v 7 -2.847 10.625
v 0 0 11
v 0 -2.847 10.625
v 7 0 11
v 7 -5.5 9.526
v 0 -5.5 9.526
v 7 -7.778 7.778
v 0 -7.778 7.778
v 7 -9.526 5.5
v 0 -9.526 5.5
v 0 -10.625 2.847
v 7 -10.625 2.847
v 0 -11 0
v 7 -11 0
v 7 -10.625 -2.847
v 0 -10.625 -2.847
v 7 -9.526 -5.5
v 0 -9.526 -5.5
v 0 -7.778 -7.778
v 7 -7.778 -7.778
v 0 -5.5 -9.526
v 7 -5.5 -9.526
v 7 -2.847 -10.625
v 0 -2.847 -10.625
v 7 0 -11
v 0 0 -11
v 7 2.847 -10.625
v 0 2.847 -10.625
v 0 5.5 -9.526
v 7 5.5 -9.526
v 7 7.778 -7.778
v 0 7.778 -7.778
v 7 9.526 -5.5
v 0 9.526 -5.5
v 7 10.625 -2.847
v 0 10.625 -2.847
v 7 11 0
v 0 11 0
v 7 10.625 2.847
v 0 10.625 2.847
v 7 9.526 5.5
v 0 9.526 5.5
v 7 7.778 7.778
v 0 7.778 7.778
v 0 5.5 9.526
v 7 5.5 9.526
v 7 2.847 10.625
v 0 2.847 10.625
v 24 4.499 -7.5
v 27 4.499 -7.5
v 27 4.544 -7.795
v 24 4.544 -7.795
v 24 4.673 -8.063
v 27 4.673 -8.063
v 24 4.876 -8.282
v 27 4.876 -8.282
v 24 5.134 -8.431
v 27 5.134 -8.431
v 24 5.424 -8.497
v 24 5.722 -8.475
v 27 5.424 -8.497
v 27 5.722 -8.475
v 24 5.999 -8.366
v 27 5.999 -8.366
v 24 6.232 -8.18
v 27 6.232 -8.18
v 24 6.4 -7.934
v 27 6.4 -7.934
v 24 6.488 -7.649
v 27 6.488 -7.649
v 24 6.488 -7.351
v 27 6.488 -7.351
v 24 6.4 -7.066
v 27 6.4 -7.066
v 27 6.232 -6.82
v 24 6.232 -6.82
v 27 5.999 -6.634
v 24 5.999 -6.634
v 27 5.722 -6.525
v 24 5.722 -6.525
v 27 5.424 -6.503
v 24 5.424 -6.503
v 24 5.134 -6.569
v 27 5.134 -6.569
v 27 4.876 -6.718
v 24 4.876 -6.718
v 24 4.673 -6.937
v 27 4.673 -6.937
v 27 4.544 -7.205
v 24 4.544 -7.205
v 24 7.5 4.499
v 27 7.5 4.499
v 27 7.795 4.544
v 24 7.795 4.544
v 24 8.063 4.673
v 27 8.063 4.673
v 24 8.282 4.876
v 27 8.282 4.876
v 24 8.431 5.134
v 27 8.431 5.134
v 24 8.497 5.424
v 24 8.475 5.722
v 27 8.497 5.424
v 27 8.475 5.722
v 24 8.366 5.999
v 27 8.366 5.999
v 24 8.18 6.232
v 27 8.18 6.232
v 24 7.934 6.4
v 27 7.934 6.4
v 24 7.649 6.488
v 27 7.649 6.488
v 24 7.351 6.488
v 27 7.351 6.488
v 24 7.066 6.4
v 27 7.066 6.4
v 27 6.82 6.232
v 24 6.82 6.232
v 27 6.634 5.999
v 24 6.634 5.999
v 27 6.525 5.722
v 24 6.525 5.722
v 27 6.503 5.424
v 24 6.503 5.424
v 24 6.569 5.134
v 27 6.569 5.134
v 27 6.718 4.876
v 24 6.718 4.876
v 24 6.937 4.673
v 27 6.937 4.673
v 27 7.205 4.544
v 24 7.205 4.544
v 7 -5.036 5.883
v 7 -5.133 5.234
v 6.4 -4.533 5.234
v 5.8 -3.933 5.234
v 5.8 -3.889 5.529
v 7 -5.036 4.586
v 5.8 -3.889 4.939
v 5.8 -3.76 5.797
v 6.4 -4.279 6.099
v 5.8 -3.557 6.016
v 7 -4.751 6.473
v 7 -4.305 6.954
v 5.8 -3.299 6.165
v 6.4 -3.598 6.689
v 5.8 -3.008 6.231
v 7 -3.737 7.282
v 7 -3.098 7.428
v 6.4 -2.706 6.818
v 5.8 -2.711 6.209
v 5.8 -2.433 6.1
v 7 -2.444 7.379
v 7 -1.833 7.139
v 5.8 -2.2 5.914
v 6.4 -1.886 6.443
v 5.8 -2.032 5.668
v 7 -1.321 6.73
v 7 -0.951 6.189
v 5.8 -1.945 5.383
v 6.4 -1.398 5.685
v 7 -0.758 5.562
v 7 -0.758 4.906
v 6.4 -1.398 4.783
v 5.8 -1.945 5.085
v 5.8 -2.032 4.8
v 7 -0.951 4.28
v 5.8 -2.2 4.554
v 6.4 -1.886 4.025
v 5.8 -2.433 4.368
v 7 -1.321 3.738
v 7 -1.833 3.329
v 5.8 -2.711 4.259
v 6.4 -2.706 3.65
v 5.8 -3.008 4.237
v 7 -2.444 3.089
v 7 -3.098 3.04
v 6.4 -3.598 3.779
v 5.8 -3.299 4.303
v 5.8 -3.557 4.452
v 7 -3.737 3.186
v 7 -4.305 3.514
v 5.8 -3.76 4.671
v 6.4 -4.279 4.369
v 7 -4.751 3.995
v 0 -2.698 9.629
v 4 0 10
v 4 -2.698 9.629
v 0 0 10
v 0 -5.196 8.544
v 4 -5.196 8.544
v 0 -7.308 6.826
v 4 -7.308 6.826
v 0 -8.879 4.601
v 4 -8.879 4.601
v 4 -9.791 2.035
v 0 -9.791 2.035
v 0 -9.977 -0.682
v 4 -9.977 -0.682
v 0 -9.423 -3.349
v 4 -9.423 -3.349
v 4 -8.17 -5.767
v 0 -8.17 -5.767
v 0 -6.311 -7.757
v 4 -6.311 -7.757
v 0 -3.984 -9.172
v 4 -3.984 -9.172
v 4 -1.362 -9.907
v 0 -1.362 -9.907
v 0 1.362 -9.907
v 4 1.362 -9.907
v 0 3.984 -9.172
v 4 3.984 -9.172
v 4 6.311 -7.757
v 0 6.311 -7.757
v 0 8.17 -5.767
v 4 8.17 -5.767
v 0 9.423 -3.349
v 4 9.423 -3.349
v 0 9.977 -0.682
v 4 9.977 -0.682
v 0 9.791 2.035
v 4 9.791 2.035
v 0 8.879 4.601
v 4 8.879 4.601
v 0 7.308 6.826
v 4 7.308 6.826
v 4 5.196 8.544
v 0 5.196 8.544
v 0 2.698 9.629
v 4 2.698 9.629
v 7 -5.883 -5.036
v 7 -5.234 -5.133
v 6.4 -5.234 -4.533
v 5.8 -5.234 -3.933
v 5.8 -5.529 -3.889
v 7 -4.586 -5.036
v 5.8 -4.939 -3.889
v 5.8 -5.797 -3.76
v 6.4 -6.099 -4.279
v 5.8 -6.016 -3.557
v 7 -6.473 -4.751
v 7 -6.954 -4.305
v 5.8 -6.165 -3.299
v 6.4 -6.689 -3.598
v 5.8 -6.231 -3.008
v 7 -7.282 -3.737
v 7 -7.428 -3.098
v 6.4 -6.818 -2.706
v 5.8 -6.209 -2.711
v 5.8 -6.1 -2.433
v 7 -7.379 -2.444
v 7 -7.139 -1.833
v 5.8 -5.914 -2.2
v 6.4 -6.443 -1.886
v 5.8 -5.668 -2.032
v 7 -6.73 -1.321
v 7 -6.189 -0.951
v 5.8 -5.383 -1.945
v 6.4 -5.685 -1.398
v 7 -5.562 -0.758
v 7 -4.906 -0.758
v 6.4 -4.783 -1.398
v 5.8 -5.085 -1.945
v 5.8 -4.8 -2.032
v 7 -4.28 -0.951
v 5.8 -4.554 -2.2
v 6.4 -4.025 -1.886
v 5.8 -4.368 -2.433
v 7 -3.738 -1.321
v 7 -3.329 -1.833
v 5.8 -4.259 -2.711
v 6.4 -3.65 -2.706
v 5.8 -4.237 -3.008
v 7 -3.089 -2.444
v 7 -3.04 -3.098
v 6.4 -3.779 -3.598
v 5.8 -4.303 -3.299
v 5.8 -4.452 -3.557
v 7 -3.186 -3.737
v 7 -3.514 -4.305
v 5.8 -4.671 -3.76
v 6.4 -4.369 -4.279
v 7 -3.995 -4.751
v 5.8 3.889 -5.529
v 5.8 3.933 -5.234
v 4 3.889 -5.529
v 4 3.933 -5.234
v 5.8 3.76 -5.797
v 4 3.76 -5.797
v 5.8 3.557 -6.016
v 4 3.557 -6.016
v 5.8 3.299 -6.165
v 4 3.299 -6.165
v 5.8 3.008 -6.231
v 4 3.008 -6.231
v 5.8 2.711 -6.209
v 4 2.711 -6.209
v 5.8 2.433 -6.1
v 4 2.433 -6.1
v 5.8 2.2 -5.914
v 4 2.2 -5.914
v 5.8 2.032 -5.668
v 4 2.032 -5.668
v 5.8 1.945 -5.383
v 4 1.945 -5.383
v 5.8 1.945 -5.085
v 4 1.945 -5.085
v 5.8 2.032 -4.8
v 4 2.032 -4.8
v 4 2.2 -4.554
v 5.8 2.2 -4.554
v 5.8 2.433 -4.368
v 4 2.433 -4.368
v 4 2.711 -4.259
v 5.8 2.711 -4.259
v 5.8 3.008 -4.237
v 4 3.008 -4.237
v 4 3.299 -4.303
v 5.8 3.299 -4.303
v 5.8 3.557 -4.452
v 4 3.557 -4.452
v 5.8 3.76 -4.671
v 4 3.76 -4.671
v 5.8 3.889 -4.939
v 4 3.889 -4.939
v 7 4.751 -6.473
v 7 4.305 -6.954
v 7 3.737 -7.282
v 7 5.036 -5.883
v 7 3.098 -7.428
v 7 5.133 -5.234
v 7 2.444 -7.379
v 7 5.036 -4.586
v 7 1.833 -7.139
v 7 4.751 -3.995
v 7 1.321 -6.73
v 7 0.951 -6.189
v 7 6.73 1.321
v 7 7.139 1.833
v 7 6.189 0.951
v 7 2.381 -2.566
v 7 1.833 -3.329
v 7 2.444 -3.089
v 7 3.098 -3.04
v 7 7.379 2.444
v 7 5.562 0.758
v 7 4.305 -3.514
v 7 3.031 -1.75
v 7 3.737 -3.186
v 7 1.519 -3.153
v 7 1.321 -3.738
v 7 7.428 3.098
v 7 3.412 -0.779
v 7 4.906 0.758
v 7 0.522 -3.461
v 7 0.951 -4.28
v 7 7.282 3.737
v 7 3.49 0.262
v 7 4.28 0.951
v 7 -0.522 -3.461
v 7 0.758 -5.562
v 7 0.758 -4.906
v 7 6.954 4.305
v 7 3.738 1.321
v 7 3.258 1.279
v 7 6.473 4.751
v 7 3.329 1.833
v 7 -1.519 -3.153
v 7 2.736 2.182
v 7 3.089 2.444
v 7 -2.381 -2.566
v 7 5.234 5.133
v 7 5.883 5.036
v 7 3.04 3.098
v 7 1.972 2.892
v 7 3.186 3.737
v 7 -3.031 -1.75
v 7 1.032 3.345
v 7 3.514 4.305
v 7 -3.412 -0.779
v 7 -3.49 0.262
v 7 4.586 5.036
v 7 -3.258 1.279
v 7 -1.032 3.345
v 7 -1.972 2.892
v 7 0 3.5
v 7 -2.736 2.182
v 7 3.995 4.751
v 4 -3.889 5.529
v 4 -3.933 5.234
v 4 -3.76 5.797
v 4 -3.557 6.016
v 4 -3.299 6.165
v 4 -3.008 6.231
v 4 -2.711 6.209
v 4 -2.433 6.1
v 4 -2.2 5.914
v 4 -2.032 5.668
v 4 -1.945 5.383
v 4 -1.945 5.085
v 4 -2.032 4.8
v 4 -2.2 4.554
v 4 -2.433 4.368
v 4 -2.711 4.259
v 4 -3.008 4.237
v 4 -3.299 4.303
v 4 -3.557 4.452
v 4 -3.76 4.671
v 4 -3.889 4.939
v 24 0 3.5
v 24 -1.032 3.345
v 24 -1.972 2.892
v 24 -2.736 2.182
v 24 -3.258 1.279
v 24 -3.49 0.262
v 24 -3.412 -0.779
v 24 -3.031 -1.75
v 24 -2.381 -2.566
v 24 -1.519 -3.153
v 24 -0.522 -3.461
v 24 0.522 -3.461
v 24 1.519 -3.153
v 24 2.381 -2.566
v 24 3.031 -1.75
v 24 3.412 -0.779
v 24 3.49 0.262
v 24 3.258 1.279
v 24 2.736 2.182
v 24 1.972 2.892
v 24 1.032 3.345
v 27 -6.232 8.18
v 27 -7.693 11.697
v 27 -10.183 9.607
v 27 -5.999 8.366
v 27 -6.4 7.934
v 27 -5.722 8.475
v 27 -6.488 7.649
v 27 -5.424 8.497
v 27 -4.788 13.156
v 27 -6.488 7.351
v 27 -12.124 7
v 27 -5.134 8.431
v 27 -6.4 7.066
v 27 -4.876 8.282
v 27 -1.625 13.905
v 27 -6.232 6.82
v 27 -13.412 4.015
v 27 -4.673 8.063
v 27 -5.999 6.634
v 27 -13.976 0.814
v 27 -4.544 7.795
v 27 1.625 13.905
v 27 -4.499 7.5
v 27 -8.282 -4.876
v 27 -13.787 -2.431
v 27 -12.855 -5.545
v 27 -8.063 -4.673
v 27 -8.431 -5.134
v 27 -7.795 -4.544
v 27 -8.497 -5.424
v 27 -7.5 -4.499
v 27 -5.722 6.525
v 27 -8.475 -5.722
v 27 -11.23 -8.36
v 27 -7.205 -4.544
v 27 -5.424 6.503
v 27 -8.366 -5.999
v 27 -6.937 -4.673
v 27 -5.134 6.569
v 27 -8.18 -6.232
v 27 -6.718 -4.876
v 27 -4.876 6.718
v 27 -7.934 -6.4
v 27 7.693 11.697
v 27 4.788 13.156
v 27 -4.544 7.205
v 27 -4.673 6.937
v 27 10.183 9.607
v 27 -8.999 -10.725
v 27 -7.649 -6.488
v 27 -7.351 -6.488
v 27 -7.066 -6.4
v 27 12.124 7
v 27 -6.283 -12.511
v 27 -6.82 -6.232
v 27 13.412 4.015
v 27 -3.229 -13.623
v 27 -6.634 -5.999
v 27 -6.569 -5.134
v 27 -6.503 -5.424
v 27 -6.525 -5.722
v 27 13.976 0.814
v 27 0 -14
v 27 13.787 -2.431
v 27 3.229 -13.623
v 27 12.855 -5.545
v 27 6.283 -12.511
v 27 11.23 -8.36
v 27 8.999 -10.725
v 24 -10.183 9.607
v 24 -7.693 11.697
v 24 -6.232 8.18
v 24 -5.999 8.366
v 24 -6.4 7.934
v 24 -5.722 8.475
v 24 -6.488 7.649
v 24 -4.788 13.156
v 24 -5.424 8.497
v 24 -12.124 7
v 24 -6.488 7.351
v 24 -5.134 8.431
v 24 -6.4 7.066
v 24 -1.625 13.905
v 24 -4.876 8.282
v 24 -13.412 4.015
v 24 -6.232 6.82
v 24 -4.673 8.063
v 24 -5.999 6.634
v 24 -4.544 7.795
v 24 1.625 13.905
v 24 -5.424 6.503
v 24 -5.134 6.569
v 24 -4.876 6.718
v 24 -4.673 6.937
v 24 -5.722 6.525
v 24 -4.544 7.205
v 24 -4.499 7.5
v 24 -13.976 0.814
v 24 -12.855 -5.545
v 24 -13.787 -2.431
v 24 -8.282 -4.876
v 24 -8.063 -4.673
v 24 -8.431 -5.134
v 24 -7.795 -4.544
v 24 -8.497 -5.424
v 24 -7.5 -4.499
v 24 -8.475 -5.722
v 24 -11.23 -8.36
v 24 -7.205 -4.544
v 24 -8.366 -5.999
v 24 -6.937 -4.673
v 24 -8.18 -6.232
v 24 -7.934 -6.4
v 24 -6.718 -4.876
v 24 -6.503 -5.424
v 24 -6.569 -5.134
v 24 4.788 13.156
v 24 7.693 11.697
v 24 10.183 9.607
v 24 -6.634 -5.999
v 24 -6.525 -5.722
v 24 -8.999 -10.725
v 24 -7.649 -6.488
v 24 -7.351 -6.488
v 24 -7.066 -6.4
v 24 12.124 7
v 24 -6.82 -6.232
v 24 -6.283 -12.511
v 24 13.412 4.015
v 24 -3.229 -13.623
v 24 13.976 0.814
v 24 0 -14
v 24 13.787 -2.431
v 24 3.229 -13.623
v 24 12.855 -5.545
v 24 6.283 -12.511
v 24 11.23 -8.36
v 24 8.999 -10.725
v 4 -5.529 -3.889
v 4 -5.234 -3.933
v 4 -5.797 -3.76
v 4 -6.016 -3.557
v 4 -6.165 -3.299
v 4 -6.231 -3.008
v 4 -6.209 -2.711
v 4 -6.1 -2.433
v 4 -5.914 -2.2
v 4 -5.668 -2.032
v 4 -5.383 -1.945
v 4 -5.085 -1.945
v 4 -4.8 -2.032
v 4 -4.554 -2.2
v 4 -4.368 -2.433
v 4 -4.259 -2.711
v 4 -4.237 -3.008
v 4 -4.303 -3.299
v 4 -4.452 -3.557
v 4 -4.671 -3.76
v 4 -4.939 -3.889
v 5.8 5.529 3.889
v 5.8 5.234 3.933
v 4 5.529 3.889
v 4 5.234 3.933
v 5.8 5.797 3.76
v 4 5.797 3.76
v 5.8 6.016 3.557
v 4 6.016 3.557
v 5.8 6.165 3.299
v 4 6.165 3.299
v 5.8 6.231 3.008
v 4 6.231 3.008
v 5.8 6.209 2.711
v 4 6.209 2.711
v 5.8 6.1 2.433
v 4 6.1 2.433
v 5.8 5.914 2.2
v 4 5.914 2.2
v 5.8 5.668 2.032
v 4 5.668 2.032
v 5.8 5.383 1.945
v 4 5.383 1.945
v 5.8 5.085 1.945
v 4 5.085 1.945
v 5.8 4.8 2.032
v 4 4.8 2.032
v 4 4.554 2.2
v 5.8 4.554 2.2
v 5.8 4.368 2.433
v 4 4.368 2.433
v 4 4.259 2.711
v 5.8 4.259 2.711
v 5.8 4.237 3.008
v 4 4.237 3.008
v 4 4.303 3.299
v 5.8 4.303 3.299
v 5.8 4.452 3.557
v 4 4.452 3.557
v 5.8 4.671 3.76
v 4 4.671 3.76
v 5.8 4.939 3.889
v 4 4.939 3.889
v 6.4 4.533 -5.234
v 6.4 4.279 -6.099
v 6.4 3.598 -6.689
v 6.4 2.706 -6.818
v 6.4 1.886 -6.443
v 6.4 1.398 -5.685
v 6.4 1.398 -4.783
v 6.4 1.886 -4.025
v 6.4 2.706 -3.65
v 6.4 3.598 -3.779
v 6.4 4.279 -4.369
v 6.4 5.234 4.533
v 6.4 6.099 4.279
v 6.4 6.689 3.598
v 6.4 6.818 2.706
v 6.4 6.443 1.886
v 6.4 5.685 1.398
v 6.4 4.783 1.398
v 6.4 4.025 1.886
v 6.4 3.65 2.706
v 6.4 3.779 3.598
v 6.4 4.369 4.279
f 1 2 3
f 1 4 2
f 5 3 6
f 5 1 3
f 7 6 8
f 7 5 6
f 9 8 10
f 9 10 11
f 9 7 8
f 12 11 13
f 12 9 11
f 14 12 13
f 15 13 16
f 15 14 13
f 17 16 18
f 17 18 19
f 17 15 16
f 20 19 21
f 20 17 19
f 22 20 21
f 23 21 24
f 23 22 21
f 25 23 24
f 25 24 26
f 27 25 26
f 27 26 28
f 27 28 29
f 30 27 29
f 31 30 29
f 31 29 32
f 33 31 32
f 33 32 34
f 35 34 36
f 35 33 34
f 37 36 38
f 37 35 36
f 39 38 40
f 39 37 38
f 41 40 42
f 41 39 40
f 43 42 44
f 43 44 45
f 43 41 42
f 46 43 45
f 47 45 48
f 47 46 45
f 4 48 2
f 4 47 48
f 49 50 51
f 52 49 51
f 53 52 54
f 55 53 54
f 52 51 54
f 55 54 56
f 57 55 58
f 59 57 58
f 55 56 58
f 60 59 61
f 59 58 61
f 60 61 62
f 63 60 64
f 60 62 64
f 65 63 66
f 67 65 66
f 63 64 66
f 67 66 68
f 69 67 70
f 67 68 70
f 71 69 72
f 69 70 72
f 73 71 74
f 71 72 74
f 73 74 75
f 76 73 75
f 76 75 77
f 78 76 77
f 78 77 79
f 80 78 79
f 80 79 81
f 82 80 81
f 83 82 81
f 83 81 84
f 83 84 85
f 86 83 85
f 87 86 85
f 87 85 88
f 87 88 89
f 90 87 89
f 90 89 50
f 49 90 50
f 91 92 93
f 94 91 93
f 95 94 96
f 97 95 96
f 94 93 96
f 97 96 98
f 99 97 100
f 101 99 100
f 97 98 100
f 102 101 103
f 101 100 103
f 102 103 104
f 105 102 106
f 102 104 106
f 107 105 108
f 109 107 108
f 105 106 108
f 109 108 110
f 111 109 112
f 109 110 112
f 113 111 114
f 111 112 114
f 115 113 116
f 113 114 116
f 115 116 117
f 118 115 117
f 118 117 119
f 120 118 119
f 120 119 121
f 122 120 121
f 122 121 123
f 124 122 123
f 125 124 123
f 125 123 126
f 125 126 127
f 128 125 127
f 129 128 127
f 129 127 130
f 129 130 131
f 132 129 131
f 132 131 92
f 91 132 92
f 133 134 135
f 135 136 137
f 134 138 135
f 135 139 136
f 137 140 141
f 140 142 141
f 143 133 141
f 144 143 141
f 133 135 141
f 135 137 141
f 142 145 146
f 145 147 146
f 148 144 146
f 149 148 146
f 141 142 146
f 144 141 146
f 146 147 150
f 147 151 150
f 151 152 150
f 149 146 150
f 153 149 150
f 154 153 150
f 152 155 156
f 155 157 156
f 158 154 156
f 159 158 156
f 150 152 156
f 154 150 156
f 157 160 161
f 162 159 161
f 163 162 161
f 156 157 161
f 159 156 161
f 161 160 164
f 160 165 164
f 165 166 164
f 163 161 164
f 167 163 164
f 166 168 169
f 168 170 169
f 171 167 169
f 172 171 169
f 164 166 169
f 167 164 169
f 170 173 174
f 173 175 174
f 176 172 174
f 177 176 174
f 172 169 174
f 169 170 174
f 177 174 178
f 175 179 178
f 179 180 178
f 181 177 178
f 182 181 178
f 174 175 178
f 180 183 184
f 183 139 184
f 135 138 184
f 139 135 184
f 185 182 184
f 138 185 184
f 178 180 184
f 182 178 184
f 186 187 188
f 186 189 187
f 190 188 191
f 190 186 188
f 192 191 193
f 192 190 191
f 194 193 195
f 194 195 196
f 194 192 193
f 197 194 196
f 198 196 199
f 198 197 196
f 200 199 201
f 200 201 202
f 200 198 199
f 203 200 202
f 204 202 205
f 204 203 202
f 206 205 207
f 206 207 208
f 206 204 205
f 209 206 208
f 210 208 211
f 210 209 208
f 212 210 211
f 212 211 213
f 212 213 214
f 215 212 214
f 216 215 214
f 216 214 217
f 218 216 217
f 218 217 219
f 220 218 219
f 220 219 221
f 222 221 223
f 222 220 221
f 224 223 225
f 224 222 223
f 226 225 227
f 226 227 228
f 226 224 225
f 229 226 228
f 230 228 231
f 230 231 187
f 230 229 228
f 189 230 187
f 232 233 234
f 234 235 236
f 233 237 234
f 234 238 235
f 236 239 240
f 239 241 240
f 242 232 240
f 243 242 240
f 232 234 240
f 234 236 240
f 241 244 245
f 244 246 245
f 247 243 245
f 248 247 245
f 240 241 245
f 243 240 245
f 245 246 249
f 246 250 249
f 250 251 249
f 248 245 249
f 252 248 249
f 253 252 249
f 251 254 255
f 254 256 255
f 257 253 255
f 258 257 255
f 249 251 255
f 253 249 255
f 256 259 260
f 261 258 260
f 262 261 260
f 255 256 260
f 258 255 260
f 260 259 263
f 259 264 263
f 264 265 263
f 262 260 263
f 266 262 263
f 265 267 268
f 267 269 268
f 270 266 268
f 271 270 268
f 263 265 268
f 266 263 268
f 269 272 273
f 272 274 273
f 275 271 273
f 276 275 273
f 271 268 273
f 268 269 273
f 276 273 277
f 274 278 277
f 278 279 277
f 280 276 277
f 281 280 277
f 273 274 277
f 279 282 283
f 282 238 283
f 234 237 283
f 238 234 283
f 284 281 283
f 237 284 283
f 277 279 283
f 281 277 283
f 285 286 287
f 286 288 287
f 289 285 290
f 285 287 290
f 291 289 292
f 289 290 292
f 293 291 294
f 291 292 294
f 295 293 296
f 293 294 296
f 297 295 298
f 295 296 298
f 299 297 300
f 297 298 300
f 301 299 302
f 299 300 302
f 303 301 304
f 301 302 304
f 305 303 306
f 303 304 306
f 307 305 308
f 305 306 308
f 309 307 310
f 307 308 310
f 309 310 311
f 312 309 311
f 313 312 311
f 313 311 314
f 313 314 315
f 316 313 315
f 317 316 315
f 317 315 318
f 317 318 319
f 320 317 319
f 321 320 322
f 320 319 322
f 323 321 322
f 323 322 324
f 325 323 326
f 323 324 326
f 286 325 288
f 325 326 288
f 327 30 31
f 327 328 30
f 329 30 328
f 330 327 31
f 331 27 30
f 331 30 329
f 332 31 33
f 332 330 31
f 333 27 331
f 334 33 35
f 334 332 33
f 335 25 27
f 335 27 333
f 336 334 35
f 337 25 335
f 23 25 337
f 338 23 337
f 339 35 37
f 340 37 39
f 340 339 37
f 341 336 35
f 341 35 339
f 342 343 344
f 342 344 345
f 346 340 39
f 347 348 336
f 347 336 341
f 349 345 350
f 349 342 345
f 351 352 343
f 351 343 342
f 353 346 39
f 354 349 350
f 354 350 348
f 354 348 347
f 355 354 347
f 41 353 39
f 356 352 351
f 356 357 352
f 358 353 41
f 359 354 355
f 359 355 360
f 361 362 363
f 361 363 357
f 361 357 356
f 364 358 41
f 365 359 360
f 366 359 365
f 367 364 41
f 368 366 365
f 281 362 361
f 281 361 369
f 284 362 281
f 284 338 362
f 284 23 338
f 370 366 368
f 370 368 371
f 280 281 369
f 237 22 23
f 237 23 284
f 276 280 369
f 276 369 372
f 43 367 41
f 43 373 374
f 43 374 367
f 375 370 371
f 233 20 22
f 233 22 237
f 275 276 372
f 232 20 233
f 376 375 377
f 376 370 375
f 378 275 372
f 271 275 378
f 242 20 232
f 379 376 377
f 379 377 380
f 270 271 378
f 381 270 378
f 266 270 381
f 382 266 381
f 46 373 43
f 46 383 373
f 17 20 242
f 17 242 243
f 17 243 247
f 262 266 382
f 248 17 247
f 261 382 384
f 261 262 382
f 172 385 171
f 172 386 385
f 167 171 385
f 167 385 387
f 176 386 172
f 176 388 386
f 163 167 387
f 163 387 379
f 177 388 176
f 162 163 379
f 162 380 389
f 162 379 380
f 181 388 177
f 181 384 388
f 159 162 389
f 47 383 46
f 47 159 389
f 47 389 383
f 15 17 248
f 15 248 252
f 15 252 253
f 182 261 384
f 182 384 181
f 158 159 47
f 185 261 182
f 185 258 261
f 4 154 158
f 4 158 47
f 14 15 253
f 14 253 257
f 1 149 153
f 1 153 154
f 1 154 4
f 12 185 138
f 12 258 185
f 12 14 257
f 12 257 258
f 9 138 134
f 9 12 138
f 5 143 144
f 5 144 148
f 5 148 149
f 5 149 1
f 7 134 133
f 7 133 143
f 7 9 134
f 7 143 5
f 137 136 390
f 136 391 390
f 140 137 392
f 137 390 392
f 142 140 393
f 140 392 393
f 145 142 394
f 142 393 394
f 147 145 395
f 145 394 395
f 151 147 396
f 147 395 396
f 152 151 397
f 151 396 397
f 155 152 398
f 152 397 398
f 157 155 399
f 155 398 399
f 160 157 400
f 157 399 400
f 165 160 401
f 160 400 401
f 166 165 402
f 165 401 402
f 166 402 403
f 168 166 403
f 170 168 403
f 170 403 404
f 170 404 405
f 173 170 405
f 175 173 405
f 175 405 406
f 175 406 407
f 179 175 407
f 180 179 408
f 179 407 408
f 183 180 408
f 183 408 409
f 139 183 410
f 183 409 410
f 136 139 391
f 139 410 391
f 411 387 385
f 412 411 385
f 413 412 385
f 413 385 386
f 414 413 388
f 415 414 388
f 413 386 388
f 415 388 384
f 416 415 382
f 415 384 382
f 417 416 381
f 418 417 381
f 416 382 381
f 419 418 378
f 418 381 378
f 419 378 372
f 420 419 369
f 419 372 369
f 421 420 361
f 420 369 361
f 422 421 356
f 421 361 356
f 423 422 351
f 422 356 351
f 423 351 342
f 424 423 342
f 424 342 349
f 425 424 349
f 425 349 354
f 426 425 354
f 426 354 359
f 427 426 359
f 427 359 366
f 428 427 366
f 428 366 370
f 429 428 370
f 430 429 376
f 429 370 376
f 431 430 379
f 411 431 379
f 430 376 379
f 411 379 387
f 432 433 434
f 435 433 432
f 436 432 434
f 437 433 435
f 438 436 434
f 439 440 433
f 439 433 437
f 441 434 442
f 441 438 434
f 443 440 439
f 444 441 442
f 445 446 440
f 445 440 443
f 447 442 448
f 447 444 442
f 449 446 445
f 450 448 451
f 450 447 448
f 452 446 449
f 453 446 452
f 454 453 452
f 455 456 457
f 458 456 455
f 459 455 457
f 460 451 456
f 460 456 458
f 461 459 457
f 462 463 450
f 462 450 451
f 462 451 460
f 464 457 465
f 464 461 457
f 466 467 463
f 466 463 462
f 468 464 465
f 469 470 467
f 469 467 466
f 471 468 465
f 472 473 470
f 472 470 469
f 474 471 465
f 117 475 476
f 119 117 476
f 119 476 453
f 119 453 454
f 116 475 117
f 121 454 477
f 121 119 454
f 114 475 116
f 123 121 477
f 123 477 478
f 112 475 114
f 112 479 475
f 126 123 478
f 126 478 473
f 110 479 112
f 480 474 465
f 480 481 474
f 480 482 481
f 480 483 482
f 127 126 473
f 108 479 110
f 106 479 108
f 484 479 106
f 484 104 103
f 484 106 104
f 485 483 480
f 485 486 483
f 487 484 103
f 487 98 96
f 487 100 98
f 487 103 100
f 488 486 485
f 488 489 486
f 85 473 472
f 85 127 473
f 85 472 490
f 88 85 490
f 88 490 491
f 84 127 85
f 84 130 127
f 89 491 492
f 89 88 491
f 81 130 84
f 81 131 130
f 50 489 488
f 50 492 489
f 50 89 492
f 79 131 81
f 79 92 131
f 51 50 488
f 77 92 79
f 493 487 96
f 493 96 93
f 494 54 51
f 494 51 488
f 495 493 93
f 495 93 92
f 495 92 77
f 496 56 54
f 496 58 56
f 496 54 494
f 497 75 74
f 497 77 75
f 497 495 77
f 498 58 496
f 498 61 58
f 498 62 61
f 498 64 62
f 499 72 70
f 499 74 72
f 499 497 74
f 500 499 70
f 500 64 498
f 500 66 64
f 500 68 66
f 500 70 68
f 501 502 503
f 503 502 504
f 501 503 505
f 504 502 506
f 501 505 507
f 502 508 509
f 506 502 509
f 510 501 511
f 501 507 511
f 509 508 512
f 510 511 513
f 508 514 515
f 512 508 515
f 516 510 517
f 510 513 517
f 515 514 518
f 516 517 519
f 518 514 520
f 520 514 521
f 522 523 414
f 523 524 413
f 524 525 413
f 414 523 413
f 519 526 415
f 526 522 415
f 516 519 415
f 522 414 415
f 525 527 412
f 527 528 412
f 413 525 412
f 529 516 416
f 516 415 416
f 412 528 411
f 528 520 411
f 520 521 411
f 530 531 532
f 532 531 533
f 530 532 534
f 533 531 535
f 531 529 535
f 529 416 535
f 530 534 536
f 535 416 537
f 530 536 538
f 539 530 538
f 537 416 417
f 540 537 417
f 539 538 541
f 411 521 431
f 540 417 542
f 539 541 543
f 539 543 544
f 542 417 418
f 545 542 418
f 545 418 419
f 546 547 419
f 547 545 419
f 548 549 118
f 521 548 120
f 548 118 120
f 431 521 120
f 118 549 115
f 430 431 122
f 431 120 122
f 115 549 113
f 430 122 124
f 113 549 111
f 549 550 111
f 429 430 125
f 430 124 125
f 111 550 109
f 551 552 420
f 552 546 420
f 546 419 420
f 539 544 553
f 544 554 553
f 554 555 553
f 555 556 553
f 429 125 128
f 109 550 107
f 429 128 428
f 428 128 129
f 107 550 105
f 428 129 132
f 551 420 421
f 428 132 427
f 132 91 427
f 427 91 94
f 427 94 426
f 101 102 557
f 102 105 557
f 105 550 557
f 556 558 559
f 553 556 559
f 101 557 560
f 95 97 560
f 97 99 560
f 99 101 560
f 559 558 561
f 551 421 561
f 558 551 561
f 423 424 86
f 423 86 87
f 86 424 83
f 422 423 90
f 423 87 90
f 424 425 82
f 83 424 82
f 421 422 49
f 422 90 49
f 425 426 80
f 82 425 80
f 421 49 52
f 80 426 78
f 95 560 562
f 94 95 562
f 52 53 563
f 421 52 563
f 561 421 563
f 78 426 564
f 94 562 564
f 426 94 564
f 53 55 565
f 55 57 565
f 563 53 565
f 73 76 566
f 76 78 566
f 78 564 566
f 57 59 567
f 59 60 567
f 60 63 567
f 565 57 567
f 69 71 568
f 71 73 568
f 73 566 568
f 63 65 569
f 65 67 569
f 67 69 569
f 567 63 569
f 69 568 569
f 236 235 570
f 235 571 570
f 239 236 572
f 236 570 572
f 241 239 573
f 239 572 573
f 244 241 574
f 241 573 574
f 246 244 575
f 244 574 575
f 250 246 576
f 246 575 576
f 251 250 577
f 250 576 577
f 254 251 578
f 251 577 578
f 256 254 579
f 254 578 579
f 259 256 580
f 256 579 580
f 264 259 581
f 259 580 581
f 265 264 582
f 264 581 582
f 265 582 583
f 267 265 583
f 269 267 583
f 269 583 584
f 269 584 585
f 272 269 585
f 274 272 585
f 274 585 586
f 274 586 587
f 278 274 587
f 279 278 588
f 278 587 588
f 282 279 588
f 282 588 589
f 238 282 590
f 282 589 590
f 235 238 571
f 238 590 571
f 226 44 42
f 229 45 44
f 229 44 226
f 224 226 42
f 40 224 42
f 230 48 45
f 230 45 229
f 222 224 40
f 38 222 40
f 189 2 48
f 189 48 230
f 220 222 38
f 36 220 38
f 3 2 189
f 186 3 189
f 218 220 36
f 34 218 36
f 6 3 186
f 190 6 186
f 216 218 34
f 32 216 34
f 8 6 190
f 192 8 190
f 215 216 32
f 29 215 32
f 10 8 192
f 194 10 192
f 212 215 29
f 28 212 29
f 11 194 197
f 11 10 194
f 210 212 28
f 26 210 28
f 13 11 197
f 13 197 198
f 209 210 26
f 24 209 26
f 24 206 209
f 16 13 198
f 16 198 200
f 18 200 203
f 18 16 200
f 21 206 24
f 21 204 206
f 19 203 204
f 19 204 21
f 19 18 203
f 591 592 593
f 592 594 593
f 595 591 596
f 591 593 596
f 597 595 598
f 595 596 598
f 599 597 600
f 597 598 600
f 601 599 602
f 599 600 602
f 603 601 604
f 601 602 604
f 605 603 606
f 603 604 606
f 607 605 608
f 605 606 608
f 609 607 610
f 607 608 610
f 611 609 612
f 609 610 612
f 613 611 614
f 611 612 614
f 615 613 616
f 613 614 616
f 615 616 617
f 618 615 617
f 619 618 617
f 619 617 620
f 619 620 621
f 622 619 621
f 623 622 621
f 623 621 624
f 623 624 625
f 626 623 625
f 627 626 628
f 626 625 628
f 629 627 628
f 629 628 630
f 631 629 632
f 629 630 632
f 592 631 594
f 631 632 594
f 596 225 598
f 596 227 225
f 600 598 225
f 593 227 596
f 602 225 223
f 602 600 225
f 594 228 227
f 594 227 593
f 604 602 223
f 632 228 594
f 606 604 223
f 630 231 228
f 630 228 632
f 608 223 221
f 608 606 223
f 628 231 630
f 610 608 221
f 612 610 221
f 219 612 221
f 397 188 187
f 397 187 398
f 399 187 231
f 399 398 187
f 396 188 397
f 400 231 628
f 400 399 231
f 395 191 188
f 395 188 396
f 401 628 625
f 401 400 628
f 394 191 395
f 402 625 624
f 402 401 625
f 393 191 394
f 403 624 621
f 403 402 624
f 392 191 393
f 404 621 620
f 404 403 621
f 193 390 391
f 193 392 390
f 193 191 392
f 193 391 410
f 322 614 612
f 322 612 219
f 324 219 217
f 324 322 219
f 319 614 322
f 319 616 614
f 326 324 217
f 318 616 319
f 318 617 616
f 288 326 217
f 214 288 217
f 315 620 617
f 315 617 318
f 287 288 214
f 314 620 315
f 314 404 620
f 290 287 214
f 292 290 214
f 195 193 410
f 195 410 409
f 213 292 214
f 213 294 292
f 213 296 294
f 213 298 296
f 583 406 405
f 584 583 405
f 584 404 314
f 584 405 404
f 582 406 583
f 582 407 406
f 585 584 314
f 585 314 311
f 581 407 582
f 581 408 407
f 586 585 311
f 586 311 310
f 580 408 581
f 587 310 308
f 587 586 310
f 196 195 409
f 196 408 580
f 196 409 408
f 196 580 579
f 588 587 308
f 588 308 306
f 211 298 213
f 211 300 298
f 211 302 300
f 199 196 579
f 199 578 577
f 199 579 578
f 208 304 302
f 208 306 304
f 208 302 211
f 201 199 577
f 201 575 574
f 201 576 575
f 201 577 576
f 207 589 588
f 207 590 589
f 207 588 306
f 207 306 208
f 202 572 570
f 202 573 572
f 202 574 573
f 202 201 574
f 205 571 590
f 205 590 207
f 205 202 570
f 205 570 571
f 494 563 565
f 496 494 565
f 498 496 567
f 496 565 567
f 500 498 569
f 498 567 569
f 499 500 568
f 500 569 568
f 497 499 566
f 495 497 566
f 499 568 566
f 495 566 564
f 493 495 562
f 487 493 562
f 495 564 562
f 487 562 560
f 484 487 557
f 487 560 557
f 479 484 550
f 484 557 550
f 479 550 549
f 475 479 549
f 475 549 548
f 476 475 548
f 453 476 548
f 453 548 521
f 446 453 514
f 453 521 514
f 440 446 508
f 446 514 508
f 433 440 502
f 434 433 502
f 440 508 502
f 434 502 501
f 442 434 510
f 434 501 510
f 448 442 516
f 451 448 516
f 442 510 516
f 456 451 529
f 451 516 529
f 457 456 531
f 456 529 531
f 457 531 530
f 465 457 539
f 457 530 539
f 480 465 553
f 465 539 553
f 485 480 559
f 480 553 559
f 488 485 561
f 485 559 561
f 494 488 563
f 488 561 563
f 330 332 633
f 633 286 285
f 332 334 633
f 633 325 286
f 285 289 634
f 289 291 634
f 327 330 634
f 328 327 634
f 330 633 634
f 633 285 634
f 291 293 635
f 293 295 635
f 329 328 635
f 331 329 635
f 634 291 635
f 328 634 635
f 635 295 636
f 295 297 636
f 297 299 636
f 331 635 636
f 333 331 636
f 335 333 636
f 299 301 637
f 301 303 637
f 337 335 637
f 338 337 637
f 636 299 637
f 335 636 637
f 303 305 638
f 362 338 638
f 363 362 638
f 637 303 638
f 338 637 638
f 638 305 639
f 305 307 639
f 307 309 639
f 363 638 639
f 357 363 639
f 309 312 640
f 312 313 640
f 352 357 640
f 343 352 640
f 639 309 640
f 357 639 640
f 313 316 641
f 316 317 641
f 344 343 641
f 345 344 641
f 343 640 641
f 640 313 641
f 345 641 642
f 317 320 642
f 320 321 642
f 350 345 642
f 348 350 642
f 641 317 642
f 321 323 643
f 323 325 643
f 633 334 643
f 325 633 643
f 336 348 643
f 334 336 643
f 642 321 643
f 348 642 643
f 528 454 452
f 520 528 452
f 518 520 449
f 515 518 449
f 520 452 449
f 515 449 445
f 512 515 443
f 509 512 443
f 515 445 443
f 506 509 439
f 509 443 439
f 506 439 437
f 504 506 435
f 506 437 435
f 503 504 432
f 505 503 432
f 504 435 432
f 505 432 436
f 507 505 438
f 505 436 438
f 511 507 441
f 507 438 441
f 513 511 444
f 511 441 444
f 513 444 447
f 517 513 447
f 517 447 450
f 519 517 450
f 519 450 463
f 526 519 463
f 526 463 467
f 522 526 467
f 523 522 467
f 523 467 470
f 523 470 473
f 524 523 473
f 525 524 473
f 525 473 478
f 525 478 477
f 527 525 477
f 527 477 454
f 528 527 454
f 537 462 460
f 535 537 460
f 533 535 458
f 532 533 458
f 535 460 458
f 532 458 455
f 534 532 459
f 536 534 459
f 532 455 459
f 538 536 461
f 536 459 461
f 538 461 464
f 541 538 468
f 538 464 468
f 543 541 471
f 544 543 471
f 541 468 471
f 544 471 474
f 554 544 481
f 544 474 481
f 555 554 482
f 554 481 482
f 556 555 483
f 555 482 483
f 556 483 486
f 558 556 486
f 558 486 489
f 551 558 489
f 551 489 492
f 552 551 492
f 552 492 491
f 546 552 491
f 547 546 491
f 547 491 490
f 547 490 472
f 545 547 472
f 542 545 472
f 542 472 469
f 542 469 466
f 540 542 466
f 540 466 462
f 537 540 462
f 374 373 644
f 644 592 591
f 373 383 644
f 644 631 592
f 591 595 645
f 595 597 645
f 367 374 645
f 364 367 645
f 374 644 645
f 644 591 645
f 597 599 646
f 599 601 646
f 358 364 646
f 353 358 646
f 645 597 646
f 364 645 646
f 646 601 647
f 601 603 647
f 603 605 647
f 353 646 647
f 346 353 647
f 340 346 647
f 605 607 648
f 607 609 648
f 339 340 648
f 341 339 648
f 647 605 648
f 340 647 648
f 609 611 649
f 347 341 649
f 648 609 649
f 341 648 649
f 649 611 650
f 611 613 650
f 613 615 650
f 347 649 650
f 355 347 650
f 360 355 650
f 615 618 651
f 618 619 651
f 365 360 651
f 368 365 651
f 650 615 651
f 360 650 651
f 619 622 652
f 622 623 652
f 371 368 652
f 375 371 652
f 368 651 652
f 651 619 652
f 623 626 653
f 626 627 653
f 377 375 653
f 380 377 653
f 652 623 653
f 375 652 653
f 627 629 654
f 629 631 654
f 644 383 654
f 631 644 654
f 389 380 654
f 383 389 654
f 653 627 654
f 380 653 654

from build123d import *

# Parameters (mm, degrees)
HOLE_WIZARD_M22_D           = 2
HOLE_WIZARD_M22_CSINK_D     = 4.4
HOLE_WIZARD_M22_CSINK_ANGLE = 90
PATTERN_CIRCULAR_2_COUNT    = 4
SKETCH_6_R                  = 3.5
EXTRUDE_1_DEPTH             = 17
SKETCH_7_R                  = 14
EXTRUDE_2_DEPTH             = 3
CUT_EXTRUDE_1_REACH         = 35.481
SKETCH_8_R                  = 1
PATTERN_CIRCULAR_3_COUNT    = 4


with BuildPart() as part:
    # Эскиз1 → Повернуть1 (revolve)
    with BuildSketch(Plane.XY):
        Polygon((0, 10), (0, 11), (7, 11), (7, 0), (4, 0), (4, 10), align=None)
    revolve(axis=Axis((0, 0, 0), (1, 0, 0)))

    # Зенковка для  винта с плоской головкой M22 (through all)
    with Locations(Plane(origin=(7, 0, 0), x_dir=(0, 0, -1), z_dir=(1, 0, 0))):
        with Locations((-2.933383142, 5.234048466)):
            hole_wizard_m22 = CounterSinkHole(HOLE_WIZARD_M22_D / 2, HOLE_WIZARD_M22_CSINK_D / 2, counter_sink_angle=HOLE_WIZARD_M22_CSINK_ANGLE)

    # Круговой массив2: Зенковка для  винта с плоской головкой M22 ×4 about axis
    pattern_circular_2_axis = Axis((4, 0, 0), (-1, 0, 0))
    for i in range(1, PATTERN_CIRCULAR_2_COUNT):
        add(hole_wizard_m22.rotate(pattern_circular_2_axis, i * 360 / PATTERN_CIRCULAR_2_COUNT), mode=Mode.SUBTRACT)

    # Эскиз6 → Бобышка-Вытянуть1 (add)
    with BuildSketch(Plane(origin=(7, 0, 0), x_dir=(0, 0, -1), z_dir=(1, 0, 0))):
        Circle(SKETCH_6_R)
    extrude(amount=EXTRUDE_1_DEPTH)

    # Эскиз7 → Бобышка-Вытянуть2 (add)
    with BuildSketch(Plane(origin=(24, 0, 0), x_dir=(0, 0, -1), z_dir=(1, 0, 0))):
        Circle(SKETCH_7_R)
    extrude(amount=EXTRUDE_2_DEPTH)

    # Эскиз8 → Вырез-Вытянуть1 (cut, up to next)
    with BuildSketch(Plane(origin=(27, 0, 0), x_dir=(0, 0, -1), z_dir=(1, 0, 0)), mode=Mode.PRIVATE) as cut_extrude_1_sk1:
        with Locations((-5.499090834, 7.5)):
            Circle(SKETCH_8_R)
    cut_extrude_1_tool1 = extrude(cut_extrude_1_sk1.sketch, amount=-CUT_EXTRUDE_1_REACH, mode=Mode.PRIVATE) & part.part
    cut_extrude_1 = cut_extrude_1_tool1.solids().sort_by_distance((27, 7.5, 5.499091))[0]
    add(cut_extrude_1, mode=Mode.SUBTRACT)

    # Круговой массив3: Вырез-Вытянуть1 ×4 about axis
    pattern_circular_3_axis = Axis((4, 0, 0), (-1, 0, 0))
    for i in range(1, PATTERN_CIRCULAR_3_COUNT):
        add(cut_extrude_1.rotate(pattern_circular_3_axis, i * 360 / PATTERN_CIRCULAR_3_COUNT), mode=Mode.SUBTRACT)


solid = part.part
